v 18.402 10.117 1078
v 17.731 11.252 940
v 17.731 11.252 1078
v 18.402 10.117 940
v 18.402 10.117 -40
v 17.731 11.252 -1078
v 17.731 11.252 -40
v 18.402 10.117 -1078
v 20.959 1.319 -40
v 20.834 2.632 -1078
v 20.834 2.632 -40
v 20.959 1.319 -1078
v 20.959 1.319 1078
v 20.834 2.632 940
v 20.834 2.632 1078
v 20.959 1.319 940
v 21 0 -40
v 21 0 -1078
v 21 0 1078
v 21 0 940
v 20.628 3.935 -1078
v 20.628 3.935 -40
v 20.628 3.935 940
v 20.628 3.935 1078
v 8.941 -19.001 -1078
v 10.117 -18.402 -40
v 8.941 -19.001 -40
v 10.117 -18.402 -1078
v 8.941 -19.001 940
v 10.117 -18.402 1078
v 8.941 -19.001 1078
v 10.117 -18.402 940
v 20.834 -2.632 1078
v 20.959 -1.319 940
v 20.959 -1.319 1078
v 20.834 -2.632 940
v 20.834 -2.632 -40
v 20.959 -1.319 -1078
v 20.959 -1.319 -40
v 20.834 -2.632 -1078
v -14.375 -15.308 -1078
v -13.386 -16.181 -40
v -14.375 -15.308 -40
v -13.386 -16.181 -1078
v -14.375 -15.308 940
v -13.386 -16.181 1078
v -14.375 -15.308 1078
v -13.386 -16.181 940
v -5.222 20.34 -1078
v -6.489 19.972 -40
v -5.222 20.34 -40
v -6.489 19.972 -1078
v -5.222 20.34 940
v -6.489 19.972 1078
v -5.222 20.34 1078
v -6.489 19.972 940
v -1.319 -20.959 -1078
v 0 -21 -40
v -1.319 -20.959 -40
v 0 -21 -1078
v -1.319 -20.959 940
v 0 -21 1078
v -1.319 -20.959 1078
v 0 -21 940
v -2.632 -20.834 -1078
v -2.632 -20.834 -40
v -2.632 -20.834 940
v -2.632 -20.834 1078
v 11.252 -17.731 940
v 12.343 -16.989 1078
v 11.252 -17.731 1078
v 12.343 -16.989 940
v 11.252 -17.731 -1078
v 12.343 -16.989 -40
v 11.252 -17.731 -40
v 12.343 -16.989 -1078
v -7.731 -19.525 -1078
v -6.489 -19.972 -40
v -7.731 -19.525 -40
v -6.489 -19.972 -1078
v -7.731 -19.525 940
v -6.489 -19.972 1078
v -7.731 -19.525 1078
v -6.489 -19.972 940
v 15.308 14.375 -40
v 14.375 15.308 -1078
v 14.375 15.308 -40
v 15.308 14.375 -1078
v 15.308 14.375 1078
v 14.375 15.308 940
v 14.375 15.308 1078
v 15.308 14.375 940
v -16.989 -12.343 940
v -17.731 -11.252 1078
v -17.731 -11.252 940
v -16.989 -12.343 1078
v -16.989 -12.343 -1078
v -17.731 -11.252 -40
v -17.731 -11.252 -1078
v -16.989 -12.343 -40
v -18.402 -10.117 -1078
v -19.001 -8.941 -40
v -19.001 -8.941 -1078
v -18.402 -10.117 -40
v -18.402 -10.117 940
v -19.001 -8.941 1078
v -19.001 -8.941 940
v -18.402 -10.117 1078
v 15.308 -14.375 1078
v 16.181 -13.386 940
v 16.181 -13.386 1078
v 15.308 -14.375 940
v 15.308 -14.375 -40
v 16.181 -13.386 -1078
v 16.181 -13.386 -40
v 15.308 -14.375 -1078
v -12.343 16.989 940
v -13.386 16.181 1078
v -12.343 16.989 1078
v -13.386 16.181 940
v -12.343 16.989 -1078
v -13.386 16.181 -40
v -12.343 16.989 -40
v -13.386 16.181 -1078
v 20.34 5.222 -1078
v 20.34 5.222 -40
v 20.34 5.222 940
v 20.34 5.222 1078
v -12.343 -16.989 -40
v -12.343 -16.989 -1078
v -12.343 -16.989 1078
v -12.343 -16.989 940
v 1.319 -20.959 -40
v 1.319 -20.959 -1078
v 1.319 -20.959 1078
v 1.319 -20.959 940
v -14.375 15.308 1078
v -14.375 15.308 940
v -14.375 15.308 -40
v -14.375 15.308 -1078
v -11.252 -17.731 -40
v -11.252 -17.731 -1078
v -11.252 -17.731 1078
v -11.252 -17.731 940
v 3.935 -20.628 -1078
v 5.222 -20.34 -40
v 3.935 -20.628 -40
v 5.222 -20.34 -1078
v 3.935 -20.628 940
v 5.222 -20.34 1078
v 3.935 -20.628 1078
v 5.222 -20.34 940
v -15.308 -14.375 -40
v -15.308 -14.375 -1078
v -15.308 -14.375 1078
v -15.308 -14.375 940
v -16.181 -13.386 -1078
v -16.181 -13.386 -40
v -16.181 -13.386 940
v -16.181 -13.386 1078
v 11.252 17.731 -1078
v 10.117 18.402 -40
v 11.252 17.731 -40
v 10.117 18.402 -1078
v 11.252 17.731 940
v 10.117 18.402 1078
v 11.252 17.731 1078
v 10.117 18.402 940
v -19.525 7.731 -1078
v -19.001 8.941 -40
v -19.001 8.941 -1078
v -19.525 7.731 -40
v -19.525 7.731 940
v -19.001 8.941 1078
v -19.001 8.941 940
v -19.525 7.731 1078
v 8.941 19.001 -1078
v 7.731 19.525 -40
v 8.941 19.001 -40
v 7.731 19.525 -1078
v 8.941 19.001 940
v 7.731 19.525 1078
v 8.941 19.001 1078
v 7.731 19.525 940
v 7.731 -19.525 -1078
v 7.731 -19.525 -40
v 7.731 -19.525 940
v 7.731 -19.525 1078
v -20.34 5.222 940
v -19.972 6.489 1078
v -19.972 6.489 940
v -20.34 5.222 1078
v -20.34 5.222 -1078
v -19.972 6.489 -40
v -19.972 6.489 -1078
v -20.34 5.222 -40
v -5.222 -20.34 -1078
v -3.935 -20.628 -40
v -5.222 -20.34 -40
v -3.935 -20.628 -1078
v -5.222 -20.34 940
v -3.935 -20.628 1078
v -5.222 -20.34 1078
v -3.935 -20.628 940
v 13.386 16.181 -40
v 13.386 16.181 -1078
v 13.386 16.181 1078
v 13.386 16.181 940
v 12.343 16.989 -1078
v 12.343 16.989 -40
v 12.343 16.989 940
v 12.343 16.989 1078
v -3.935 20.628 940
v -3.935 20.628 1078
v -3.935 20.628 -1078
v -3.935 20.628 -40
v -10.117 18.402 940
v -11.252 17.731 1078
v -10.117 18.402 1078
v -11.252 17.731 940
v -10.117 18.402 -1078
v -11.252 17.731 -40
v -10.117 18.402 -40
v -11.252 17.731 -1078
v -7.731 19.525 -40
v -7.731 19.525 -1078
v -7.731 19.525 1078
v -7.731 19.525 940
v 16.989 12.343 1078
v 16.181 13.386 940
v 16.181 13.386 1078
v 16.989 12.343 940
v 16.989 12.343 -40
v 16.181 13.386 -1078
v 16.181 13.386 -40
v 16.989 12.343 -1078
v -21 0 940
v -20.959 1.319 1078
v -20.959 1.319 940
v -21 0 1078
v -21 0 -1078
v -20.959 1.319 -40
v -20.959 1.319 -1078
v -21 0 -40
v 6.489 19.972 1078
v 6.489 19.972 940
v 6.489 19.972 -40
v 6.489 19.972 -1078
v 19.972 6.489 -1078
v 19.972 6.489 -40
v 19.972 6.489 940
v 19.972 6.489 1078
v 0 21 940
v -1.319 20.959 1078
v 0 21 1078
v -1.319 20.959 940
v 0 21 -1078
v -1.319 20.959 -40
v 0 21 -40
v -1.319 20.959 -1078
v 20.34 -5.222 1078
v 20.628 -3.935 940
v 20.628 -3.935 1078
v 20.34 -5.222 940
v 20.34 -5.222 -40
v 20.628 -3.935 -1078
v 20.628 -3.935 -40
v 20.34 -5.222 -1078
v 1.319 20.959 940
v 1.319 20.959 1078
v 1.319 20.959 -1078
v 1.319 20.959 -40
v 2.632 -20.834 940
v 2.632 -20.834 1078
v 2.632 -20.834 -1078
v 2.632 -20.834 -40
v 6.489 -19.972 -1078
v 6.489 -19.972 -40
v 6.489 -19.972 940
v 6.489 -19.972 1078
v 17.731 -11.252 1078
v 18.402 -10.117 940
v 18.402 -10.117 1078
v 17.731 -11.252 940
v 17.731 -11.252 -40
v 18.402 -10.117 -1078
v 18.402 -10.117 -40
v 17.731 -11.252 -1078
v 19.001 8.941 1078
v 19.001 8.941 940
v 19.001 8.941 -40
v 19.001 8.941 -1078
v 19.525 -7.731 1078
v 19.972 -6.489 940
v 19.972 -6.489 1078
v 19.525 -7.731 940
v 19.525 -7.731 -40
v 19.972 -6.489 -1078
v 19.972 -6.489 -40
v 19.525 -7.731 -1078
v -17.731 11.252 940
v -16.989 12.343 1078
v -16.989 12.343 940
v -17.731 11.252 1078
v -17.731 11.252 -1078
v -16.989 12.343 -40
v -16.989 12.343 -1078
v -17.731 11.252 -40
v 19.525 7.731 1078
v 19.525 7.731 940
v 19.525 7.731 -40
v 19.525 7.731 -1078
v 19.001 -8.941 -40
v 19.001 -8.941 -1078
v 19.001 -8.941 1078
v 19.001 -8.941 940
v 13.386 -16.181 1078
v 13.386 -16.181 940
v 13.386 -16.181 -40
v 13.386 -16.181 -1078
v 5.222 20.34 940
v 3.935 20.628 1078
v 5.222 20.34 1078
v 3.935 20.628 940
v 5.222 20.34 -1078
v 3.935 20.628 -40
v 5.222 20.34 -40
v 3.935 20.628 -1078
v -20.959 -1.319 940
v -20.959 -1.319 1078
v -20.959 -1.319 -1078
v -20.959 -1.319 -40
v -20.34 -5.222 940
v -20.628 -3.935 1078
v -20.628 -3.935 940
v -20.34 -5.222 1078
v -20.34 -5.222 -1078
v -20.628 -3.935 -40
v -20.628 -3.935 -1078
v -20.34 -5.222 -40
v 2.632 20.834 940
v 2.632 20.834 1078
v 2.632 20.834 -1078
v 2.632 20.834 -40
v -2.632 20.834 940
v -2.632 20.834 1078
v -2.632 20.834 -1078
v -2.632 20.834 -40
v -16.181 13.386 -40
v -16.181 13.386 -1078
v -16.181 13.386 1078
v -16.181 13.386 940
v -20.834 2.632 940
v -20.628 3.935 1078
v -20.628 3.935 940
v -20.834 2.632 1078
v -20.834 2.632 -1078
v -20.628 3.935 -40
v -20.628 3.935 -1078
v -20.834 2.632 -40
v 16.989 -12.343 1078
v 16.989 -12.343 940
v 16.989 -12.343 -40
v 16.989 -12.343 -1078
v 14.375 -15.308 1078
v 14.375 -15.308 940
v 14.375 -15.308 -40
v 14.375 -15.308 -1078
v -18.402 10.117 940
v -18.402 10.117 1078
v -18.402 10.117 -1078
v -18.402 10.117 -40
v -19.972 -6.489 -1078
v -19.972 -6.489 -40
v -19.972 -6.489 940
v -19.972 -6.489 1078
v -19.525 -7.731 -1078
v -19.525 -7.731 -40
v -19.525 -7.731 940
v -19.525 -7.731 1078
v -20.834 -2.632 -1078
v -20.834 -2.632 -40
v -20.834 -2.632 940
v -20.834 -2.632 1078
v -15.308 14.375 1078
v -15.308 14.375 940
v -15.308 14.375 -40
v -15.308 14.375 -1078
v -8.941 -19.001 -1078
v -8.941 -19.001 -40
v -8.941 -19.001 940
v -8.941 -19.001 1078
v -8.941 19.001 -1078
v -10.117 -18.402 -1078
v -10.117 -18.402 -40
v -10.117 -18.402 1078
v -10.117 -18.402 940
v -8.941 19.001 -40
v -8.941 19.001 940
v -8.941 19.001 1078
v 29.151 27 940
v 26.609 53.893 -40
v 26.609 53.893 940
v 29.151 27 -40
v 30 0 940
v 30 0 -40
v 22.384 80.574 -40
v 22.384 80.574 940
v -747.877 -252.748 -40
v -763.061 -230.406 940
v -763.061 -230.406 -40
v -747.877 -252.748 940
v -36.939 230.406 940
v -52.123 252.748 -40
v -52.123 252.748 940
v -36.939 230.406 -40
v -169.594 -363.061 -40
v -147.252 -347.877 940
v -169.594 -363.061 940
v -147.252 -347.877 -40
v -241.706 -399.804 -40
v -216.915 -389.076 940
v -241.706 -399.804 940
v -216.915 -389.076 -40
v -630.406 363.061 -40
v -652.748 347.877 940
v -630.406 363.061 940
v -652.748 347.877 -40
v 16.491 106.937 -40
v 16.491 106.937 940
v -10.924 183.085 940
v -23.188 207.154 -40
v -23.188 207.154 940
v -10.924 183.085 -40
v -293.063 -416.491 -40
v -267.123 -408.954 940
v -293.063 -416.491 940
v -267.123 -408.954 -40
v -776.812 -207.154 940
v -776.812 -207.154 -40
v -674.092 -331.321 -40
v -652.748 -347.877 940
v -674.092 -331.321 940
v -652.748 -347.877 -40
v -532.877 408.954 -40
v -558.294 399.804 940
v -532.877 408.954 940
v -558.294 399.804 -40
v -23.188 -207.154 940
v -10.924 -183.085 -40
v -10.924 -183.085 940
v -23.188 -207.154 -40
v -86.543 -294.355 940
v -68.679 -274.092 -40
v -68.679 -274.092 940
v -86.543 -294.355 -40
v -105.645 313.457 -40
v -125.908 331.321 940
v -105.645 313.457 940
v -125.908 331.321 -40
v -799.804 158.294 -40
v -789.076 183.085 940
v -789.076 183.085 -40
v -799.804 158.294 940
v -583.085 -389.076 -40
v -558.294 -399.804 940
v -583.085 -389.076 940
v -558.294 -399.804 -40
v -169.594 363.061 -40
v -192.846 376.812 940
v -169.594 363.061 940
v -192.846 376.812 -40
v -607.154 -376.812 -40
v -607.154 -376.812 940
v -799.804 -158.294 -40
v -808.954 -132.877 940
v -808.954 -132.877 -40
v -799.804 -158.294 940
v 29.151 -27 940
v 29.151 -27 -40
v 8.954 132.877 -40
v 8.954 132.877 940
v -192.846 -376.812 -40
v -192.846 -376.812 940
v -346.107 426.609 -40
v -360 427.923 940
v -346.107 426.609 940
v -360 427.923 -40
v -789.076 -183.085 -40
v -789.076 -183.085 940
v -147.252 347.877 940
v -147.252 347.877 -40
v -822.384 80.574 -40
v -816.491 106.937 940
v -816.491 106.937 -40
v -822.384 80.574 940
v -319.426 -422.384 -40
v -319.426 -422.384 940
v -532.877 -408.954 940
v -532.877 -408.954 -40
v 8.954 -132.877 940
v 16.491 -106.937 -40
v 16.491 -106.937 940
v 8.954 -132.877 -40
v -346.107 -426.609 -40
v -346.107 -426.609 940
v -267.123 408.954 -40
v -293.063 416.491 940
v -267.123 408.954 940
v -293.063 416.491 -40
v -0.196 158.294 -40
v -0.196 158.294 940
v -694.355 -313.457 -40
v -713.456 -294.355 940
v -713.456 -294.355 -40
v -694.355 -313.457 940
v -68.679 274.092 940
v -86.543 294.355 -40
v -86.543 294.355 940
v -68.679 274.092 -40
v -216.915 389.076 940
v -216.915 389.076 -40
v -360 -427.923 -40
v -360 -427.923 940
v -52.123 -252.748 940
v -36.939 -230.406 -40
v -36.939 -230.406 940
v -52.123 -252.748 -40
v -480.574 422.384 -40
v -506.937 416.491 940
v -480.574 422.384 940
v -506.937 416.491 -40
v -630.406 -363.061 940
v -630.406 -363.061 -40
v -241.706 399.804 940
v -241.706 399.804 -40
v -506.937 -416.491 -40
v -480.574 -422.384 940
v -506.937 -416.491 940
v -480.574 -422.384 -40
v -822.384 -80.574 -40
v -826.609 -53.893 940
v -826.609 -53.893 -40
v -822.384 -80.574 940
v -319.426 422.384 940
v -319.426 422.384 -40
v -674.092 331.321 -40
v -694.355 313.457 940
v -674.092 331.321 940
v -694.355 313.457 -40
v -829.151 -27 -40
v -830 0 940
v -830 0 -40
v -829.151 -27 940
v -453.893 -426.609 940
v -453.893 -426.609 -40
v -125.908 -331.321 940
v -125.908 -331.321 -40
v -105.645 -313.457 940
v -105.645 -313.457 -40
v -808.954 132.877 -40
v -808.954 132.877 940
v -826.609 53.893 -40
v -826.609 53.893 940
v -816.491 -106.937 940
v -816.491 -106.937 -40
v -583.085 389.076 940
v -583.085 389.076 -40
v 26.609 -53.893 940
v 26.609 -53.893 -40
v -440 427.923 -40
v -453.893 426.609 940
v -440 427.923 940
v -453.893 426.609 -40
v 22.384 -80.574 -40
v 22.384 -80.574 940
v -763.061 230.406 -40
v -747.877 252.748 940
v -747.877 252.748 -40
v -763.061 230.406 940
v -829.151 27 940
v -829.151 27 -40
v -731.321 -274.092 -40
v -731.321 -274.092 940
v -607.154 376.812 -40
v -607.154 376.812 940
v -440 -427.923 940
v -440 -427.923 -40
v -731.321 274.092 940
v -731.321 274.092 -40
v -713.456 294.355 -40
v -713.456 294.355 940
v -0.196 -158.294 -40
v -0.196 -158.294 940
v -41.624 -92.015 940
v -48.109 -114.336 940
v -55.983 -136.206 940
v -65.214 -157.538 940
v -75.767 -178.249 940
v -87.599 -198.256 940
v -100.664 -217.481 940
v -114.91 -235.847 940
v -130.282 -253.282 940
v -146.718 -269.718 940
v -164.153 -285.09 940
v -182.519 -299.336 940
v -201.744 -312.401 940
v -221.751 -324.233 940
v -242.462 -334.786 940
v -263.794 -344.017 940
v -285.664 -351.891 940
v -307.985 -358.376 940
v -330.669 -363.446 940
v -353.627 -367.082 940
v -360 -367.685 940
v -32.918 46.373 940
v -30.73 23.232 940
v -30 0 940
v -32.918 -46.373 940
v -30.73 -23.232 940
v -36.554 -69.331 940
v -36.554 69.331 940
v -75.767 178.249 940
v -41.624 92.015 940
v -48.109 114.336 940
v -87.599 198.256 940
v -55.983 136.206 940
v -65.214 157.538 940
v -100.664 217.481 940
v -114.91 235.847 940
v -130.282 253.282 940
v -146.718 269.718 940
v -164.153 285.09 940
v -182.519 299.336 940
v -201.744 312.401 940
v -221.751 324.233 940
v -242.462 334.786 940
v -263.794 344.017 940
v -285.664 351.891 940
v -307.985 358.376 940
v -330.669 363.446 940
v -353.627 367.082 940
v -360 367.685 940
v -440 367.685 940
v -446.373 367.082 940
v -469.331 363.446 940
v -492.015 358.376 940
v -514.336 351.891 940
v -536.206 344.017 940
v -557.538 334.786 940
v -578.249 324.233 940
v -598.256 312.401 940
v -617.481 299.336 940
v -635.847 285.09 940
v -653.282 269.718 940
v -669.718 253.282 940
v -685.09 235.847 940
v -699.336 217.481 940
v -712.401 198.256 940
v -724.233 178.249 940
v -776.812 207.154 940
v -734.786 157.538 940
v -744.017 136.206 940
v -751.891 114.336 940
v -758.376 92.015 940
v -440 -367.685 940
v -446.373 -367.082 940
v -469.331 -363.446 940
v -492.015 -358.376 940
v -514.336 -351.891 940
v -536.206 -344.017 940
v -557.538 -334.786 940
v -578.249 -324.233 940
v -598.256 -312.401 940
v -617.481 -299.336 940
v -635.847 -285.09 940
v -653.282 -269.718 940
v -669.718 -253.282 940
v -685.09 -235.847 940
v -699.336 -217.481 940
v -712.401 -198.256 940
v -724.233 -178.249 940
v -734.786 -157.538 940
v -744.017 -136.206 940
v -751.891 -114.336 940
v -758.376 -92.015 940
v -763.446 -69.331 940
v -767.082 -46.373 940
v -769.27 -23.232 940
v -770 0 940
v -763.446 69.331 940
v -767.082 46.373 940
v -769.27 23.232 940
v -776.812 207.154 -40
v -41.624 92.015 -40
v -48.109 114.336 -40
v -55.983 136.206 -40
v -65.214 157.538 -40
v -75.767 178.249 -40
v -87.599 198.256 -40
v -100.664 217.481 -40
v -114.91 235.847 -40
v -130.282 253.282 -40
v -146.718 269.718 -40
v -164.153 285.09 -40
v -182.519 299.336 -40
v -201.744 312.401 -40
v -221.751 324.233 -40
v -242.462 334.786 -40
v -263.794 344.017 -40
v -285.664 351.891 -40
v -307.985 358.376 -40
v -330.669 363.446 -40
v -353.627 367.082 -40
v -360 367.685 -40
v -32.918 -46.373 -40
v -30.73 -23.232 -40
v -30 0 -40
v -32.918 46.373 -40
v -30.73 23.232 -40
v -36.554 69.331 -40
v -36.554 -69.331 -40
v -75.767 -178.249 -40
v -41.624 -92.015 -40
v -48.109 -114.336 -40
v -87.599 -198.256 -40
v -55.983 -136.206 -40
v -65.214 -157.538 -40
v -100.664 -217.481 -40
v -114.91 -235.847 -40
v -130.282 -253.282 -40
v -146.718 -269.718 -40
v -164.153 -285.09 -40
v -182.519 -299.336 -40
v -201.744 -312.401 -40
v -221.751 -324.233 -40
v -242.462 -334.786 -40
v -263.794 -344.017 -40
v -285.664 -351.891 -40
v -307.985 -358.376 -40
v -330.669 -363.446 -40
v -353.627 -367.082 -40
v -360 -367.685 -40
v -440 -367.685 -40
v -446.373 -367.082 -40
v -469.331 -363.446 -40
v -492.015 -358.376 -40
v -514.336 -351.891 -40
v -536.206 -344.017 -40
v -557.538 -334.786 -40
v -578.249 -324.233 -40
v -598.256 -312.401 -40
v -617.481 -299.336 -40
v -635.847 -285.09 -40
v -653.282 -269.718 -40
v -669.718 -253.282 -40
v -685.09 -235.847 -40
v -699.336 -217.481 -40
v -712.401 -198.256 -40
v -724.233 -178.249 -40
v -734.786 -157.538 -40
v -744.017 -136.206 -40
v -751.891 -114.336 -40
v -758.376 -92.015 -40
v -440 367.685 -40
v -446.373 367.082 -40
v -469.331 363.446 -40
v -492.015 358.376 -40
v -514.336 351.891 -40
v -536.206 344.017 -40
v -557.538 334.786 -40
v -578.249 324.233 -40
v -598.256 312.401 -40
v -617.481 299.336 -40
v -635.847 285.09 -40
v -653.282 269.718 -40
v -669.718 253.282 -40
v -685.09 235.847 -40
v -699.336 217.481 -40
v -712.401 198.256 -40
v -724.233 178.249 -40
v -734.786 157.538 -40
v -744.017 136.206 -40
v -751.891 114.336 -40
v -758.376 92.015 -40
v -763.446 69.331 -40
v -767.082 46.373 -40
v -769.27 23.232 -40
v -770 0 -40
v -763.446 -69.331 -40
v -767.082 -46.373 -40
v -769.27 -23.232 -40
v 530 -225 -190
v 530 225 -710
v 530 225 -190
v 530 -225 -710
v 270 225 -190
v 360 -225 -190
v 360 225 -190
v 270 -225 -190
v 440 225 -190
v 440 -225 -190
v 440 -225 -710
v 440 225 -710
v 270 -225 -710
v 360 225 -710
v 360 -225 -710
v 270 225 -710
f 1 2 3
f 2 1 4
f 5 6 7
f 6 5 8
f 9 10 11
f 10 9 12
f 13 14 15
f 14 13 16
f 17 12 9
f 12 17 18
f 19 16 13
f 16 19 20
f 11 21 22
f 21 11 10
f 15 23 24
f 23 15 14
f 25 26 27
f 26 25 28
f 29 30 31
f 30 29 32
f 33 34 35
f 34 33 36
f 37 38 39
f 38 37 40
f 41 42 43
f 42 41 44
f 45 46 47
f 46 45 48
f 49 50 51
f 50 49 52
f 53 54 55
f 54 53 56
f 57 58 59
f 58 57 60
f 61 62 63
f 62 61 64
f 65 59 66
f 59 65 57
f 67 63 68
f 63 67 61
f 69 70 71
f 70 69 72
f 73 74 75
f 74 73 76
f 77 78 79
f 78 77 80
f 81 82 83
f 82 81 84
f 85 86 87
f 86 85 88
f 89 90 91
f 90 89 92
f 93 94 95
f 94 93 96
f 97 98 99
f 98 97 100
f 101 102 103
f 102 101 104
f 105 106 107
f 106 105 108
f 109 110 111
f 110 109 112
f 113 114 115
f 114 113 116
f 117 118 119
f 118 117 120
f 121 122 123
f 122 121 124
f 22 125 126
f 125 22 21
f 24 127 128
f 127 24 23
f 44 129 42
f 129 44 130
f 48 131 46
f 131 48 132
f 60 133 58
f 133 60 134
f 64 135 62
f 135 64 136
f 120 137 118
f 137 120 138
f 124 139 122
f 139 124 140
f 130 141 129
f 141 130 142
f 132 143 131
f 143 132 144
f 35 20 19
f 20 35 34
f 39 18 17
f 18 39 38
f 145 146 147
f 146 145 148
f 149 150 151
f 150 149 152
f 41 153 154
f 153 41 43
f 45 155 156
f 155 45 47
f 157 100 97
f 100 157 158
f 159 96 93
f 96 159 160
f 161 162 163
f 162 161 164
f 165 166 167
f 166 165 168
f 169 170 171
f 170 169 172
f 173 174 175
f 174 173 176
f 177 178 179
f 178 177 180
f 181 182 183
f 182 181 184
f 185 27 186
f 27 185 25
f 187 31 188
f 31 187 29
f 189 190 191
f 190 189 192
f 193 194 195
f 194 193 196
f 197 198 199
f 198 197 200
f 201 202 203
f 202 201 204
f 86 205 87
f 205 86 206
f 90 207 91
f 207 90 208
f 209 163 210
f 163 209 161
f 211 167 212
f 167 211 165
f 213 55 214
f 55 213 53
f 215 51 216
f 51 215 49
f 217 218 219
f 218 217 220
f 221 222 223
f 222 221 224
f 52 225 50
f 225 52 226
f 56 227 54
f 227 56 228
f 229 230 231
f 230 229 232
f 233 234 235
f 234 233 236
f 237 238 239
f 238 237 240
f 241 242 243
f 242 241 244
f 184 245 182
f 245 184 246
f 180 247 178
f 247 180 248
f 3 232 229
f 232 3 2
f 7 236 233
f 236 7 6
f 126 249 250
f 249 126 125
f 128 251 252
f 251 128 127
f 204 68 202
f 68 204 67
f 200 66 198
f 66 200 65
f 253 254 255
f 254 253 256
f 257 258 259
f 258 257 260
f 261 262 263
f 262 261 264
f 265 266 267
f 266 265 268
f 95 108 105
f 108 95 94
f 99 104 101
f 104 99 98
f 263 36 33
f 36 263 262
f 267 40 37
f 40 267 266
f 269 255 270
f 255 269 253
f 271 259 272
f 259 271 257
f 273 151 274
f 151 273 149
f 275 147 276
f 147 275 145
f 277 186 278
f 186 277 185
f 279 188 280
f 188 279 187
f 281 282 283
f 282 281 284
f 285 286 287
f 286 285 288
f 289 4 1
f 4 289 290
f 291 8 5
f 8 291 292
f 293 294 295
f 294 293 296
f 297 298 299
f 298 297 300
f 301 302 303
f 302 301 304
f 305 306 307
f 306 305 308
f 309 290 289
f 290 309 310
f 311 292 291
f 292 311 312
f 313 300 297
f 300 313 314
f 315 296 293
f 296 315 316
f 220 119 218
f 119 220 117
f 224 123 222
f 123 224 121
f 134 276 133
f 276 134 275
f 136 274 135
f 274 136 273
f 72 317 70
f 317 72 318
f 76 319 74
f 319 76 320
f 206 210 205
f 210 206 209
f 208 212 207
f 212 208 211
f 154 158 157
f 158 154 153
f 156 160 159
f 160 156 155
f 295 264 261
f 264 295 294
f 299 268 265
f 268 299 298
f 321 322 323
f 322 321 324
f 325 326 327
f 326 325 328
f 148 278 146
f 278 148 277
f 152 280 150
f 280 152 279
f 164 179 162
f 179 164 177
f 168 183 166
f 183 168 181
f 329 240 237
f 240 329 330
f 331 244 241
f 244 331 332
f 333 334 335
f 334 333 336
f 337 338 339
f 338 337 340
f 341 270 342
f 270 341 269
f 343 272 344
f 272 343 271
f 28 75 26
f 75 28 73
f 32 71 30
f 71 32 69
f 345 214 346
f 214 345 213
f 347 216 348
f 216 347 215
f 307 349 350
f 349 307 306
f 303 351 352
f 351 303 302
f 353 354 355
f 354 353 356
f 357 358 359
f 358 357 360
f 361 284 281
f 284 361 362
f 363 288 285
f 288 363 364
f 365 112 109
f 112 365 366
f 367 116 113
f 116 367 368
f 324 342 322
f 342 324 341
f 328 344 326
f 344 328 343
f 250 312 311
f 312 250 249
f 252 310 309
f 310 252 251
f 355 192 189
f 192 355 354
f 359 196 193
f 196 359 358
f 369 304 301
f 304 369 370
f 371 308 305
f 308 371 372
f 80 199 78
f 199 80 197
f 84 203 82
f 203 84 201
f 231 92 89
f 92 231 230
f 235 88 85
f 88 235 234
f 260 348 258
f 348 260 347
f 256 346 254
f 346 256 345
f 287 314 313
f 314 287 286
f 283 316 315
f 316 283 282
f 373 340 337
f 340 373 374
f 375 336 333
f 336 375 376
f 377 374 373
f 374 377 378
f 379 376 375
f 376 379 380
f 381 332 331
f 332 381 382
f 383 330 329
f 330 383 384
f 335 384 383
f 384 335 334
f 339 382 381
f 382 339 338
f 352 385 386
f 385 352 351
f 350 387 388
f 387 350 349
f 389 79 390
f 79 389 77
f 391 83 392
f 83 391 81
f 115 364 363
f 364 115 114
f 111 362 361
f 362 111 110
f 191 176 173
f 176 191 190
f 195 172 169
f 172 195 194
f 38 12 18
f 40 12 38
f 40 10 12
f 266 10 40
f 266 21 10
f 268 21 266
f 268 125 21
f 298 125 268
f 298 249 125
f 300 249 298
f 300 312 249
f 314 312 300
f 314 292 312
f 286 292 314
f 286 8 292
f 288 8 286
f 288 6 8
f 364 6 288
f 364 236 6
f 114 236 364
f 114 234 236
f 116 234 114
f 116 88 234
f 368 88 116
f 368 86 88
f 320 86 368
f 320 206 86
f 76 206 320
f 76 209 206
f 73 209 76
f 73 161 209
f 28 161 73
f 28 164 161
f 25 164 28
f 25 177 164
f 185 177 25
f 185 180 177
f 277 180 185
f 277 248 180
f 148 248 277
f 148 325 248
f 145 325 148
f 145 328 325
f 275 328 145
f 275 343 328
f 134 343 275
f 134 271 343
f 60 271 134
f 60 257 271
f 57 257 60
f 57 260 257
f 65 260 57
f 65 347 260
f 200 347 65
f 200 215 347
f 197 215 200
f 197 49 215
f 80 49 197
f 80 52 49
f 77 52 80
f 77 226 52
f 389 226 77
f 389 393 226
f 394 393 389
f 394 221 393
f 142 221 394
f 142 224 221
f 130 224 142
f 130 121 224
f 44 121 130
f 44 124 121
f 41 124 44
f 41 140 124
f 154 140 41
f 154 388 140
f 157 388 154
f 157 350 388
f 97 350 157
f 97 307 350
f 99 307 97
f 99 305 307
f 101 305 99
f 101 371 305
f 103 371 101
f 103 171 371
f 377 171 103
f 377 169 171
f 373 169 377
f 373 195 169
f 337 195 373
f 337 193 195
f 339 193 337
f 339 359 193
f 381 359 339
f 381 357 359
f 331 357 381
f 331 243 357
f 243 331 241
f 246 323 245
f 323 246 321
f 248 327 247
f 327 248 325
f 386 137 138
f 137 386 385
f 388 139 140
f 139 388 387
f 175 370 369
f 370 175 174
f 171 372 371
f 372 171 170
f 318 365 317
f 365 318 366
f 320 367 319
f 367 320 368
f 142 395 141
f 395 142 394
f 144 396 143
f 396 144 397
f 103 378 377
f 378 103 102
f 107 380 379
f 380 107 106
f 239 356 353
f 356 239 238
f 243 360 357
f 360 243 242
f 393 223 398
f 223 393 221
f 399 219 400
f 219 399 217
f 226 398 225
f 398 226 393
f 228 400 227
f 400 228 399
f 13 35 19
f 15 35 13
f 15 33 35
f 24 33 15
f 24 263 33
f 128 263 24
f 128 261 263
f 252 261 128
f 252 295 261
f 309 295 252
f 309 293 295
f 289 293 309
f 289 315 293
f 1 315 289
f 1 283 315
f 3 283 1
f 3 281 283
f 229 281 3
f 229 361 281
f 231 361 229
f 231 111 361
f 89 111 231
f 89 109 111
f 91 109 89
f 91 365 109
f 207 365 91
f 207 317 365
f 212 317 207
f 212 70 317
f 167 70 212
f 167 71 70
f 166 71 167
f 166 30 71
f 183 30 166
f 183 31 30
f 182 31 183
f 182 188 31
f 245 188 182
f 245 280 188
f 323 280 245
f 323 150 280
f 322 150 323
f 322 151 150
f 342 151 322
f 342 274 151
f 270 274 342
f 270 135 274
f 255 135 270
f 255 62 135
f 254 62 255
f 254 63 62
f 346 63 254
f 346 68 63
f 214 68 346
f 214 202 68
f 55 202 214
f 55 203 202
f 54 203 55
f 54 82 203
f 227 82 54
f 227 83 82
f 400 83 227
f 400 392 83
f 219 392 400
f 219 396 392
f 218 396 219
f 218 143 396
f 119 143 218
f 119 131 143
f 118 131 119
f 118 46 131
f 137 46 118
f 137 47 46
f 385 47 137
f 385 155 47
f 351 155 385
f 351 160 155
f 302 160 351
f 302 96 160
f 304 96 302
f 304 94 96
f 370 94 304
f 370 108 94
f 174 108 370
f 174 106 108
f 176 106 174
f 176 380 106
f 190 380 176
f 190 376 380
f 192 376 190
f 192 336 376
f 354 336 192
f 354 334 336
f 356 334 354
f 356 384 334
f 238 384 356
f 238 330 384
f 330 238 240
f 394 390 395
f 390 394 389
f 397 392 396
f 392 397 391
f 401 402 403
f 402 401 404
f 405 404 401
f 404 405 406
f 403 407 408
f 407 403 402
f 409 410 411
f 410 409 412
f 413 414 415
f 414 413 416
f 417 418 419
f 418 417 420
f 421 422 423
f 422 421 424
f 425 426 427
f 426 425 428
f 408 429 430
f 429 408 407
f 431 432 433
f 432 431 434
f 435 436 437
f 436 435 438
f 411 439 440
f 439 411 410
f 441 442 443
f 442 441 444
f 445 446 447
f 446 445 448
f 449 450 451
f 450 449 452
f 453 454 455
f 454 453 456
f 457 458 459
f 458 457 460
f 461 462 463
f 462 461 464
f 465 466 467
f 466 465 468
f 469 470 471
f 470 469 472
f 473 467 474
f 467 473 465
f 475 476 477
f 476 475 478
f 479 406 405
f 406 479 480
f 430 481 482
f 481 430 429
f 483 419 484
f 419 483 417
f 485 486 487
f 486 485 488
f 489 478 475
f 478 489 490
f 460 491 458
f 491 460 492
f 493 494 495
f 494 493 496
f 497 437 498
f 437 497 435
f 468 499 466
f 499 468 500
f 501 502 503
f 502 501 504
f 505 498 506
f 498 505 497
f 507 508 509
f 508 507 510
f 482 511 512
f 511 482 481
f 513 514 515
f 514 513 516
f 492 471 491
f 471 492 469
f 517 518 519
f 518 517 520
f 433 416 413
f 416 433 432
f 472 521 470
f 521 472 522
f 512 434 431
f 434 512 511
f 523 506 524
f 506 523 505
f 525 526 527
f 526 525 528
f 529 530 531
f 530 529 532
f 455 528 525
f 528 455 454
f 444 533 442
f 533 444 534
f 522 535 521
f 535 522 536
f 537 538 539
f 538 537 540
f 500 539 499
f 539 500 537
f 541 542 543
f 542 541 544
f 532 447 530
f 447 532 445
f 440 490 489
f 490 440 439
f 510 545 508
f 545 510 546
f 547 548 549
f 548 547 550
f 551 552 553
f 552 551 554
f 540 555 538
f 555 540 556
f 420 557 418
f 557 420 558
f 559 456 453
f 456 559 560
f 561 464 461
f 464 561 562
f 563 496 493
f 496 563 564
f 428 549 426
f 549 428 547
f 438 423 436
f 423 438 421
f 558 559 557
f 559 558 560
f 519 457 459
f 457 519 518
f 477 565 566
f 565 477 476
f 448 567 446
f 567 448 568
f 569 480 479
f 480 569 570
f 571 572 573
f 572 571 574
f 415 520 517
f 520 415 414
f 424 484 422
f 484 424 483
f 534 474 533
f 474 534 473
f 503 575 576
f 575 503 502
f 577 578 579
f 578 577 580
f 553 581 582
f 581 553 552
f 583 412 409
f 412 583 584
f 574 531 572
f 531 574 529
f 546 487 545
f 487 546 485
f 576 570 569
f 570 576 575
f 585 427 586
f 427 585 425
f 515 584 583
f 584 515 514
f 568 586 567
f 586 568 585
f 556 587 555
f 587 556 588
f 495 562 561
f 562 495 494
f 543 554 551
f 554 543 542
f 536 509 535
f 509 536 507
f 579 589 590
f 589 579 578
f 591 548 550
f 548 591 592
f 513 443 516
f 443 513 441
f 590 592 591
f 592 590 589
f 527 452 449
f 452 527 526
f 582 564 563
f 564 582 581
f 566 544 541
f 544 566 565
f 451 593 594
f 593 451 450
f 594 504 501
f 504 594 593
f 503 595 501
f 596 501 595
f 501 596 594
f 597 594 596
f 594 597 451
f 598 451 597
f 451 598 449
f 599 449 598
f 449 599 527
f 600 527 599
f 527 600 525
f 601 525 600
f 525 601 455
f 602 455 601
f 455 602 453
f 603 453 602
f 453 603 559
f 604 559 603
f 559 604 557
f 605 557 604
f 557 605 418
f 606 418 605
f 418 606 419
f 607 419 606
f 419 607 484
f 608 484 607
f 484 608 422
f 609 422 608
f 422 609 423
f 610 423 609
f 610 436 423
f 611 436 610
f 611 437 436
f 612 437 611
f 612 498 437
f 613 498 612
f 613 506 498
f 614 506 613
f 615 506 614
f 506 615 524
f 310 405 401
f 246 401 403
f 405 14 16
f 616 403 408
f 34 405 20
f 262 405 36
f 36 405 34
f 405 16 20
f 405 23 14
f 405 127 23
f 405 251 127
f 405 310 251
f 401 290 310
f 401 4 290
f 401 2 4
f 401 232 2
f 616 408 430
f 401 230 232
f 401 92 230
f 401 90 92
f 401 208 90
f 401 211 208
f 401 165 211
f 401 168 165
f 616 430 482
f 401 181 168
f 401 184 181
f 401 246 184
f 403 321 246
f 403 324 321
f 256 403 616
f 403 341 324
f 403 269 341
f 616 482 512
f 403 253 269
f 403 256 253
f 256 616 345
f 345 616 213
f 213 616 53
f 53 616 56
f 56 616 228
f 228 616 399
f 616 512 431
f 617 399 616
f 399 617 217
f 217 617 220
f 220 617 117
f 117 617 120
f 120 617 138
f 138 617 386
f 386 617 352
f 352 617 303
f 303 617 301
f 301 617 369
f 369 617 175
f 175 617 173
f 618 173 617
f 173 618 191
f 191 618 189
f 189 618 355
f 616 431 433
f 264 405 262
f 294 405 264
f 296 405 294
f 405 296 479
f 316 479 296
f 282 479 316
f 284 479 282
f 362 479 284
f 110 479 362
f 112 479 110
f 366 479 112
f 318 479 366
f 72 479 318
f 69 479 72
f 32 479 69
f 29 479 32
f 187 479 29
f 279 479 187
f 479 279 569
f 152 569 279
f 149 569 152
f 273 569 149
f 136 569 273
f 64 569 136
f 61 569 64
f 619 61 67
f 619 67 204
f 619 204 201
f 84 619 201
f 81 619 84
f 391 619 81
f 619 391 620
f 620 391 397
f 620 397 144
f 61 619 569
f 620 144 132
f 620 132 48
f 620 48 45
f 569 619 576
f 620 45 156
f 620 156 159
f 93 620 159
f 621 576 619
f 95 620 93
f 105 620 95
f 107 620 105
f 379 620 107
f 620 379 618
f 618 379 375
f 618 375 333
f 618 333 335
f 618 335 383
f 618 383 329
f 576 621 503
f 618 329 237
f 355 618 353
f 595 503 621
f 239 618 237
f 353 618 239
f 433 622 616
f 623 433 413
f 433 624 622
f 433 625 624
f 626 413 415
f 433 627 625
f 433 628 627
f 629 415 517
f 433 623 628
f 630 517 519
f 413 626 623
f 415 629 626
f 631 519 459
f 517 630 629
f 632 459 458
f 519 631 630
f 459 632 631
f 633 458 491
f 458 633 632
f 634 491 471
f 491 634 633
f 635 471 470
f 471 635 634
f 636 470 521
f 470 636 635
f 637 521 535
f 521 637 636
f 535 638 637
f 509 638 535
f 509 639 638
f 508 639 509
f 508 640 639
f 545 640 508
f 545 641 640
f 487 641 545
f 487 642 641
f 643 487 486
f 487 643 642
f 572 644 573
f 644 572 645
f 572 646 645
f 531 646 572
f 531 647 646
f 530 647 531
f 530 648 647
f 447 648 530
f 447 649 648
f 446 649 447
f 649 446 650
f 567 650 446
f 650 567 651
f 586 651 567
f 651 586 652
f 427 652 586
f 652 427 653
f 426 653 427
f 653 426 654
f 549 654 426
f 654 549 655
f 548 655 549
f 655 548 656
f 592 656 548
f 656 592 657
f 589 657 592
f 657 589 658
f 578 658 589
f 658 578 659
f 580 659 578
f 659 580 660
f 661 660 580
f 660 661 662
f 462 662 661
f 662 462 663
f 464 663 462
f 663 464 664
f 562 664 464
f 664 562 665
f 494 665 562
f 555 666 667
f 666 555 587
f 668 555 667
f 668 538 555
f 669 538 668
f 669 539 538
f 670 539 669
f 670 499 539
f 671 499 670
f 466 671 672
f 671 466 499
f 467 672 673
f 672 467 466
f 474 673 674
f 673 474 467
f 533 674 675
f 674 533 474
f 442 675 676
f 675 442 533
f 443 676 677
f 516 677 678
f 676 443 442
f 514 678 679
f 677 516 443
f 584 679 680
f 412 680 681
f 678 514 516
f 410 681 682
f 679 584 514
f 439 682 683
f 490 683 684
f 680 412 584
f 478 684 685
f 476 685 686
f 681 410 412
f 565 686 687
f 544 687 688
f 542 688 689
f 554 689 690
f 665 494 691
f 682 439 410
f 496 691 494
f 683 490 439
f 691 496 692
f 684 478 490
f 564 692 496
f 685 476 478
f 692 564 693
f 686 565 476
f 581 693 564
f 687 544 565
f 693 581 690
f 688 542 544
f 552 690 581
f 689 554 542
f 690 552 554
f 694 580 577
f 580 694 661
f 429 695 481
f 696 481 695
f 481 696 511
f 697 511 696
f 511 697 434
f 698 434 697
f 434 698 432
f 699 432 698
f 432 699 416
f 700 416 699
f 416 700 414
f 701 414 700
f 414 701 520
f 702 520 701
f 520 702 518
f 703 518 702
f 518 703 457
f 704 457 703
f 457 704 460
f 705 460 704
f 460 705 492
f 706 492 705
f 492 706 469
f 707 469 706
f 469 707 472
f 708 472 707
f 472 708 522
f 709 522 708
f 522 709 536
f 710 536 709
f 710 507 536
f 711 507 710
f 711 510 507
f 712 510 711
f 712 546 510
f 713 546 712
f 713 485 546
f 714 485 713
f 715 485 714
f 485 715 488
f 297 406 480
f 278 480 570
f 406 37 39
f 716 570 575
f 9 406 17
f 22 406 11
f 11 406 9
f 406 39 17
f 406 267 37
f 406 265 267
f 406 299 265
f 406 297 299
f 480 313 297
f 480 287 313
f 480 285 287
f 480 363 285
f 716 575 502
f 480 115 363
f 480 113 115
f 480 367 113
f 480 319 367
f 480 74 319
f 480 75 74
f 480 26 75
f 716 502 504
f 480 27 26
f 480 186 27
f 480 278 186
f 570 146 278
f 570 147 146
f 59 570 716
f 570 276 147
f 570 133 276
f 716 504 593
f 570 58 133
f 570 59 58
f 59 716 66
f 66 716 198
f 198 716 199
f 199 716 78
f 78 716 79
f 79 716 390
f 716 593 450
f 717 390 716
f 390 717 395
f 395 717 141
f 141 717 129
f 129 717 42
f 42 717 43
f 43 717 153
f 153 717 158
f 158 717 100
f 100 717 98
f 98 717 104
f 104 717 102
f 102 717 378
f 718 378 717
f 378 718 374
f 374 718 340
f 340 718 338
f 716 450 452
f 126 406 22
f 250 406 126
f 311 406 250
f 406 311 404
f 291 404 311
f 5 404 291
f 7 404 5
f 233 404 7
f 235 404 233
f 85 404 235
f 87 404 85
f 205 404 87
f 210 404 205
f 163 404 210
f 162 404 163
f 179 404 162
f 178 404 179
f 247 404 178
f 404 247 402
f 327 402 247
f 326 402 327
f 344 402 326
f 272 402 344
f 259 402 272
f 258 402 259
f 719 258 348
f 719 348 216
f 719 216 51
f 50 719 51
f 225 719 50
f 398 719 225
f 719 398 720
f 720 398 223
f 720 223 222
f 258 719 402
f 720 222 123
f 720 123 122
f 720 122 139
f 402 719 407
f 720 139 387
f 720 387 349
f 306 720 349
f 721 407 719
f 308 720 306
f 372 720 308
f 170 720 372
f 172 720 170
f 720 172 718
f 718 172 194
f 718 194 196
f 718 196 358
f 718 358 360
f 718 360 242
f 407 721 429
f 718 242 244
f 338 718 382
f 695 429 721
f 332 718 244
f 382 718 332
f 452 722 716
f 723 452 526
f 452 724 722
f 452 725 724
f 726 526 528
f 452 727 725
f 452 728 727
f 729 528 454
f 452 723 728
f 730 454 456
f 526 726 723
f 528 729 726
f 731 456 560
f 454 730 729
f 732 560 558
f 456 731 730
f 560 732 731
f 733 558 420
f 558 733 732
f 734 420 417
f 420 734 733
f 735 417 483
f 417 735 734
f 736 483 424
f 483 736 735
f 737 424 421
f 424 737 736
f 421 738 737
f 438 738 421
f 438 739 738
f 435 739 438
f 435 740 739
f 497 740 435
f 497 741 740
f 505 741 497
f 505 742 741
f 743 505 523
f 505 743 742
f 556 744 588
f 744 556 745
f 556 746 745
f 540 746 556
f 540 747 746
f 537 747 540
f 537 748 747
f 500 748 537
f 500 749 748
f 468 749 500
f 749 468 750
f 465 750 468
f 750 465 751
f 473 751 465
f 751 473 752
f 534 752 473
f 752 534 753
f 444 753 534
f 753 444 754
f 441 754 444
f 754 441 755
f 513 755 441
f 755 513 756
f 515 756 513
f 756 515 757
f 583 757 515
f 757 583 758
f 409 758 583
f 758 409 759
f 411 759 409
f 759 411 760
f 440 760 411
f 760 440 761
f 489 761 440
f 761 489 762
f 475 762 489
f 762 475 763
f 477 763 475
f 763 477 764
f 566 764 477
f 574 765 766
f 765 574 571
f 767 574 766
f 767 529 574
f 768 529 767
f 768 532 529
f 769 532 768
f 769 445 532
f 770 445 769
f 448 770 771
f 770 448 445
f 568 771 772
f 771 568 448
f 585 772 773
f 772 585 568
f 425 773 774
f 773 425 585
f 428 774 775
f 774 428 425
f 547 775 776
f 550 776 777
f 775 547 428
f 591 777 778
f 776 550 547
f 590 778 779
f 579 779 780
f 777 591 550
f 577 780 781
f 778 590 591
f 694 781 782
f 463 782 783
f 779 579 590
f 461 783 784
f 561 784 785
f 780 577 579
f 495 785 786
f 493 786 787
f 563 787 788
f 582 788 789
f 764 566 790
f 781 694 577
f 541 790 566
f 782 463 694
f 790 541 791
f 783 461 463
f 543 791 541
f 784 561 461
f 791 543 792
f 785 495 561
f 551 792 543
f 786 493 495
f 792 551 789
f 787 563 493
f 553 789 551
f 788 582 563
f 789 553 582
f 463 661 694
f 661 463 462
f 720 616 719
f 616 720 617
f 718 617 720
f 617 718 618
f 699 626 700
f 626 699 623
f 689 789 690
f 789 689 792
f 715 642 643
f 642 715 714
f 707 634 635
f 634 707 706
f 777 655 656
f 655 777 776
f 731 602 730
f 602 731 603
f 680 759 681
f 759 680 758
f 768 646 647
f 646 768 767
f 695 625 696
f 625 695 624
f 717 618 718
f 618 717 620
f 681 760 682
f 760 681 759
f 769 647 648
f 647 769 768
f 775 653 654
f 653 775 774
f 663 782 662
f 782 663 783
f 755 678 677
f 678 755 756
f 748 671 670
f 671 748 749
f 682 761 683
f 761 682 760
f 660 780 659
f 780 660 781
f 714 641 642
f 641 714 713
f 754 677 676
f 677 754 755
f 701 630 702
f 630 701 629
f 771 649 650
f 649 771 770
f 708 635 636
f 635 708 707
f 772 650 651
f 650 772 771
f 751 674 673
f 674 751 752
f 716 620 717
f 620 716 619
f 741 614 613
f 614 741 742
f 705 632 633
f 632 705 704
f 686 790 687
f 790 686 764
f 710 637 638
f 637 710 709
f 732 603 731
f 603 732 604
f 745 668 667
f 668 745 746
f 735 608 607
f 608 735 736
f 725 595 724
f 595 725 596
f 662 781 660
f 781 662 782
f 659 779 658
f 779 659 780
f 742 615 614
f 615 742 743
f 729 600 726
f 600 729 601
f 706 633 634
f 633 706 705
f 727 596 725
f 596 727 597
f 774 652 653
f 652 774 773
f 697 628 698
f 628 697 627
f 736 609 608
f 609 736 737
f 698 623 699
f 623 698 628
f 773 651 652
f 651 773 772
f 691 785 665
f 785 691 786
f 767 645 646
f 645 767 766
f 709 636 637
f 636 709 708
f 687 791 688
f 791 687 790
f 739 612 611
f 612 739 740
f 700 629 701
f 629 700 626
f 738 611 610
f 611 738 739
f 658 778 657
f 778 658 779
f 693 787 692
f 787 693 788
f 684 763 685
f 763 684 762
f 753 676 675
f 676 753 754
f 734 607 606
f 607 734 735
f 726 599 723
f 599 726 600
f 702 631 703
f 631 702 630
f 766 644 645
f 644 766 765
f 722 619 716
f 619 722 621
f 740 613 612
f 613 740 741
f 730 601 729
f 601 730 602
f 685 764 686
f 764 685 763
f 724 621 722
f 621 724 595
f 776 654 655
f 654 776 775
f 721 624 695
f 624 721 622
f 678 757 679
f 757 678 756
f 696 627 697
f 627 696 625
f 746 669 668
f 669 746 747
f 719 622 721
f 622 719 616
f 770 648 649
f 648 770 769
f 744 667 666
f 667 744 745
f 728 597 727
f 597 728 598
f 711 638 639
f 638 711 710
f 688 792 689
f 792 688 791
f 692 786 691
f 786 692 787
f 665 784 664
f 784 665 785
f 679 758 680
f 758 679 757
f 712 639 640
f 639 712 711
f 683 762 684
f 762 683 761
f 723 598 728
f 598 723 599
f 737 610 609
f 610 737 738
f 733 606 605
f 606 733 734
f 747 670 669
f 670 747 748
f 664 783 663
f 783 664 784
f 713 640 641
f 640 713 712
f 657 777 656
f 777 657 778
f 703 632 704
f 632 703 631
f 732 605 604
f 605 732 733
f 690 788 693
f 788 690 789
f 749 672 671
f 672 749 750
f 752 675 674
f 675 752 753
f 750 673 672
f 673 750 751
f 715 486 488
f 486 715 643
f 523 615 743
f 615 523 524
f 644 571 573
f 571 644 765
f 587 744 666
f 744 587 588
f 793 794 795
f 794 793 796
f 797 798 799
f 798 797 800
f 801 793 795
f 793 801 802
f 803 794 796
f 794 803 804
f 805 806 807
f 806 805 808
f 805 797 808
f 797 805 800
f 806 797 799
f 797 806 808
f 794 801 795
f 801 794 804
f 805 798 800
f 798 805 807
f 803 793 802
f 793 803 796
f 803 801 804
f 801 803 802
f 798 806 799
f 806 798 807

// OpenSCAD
// ============================================================================
// PROJECT: XXXG-00W0 WING GUNDAM ZERO EW - THRUST REBALANCING MATRIX
// COMPONENT VAULT: BANDAI CAST RUNNER B - EXHAUST NOZZLES B21 & B22
// ENGINE SPEC: ELECTROACOUSTIC PLASMA VORTEX MOUNT COMPLETION
// ELECTRICAL PARITY: SOLID-STATE EMBEDDED CONDUITS FOR SQUARE-WAVE RETROFITTING
// ============================================================================

$fn = 100; // Circular segment resolution calculation count

// Sizing Constants Scaled 1:1 for a 16.7-Meter Airframe Scale (mm)
exhaust_barrel_length = 980;            // Total longitudinal exhaust axis (mm)
nozzle_throat_diameter = 740;           // Core gas containment inner width (mm)
armor_casing_wall = 60;                 // Solid TiAl protective wall thickness (mm)
harness_conduit_width = 80;             // Cast-in 4oz copper logic trace track (mm)
vector_flap_length = 520;               // B22 variable deflection plate axis (mm)

module Runner_B_Exhaust_Forge() {
    // Central Supply Injection Runner Axis (Molten Feed Line from Siphon Forge)
    color([0.22, 0.22, 0.24]) {
        cylinder(h = exhaust_barrel_length * 2.2, d = 42, center = true);
        // Direct injection gates tracking straight into the part mold cavities
        translate() rotate() cylinder(h = 450, d = 22);
        translate([0, 0, -500]) rotate() cylinder(h = 450, d = 22);
    }
    
    // Instantiate Scaled Structural Molds Symmetrically
    Cast_Exhaust_Vector_Components();
}

module Cast_Exhaust_Vector_Components() {
    // ---- PART B21: CENTRAL EXHAUST CONTAINMENT BARREL ---- [Page 18, Step 10-1]
    translate([-400, 0, 450]) color([0.7, 0.7, 0.75]) { // Standard Armor Grey Spec
        difference() {
            // Main solid heavy-duty high-pressure containment block
            cylinder(h = exhaust_barrel_length, d = nozzle_throat_diameter + (armor_casing_wall * 2), center = true);
            
            // Core Exhaust Bore Path (Isolates gas during sound excitation loops)
            cylinder(h = exhaust_barrel_length + 20, d = nozzle_throat_diameter, center = true);
            
            // Continuous cast-in routing track for the 4oz solid-state wiring rails
            cube([harness_conduit_width, nozzle_throat_diameter + 150, exhaust_barrel_length + 10], center = true);
        }
    }
    
    // ---- PART B22: VARIABLE DEFLECTION EXHAUST FLAP ---- [Page 18, Step 10-3]
    // Houses internal electromagnetic hinges to execute zero-delay steering shifts
    translate([400, 0, -450]) color([0.3, 0.3, 0.32]) { // Inner Frame Dark Spec
        difference() {
            // Flat tapered deflection vector shield plate segment
            cube([260, 450, vector_flap_length], center = true);
            
            // Internal mounting slot for the air-gapped magnetic track pins
            translate([0, 0, (vector_flap_length/2 - 60)])
                rotate() cylinder(h = 300, d = 45, center = true);
                
            cube([harness_conduit_width, 500, vector_flap_length + 10], center = true);
        }
    }
}

// Render Master Assembly to Parameter Workspace
Runner_B_Exhaust_Forge();
